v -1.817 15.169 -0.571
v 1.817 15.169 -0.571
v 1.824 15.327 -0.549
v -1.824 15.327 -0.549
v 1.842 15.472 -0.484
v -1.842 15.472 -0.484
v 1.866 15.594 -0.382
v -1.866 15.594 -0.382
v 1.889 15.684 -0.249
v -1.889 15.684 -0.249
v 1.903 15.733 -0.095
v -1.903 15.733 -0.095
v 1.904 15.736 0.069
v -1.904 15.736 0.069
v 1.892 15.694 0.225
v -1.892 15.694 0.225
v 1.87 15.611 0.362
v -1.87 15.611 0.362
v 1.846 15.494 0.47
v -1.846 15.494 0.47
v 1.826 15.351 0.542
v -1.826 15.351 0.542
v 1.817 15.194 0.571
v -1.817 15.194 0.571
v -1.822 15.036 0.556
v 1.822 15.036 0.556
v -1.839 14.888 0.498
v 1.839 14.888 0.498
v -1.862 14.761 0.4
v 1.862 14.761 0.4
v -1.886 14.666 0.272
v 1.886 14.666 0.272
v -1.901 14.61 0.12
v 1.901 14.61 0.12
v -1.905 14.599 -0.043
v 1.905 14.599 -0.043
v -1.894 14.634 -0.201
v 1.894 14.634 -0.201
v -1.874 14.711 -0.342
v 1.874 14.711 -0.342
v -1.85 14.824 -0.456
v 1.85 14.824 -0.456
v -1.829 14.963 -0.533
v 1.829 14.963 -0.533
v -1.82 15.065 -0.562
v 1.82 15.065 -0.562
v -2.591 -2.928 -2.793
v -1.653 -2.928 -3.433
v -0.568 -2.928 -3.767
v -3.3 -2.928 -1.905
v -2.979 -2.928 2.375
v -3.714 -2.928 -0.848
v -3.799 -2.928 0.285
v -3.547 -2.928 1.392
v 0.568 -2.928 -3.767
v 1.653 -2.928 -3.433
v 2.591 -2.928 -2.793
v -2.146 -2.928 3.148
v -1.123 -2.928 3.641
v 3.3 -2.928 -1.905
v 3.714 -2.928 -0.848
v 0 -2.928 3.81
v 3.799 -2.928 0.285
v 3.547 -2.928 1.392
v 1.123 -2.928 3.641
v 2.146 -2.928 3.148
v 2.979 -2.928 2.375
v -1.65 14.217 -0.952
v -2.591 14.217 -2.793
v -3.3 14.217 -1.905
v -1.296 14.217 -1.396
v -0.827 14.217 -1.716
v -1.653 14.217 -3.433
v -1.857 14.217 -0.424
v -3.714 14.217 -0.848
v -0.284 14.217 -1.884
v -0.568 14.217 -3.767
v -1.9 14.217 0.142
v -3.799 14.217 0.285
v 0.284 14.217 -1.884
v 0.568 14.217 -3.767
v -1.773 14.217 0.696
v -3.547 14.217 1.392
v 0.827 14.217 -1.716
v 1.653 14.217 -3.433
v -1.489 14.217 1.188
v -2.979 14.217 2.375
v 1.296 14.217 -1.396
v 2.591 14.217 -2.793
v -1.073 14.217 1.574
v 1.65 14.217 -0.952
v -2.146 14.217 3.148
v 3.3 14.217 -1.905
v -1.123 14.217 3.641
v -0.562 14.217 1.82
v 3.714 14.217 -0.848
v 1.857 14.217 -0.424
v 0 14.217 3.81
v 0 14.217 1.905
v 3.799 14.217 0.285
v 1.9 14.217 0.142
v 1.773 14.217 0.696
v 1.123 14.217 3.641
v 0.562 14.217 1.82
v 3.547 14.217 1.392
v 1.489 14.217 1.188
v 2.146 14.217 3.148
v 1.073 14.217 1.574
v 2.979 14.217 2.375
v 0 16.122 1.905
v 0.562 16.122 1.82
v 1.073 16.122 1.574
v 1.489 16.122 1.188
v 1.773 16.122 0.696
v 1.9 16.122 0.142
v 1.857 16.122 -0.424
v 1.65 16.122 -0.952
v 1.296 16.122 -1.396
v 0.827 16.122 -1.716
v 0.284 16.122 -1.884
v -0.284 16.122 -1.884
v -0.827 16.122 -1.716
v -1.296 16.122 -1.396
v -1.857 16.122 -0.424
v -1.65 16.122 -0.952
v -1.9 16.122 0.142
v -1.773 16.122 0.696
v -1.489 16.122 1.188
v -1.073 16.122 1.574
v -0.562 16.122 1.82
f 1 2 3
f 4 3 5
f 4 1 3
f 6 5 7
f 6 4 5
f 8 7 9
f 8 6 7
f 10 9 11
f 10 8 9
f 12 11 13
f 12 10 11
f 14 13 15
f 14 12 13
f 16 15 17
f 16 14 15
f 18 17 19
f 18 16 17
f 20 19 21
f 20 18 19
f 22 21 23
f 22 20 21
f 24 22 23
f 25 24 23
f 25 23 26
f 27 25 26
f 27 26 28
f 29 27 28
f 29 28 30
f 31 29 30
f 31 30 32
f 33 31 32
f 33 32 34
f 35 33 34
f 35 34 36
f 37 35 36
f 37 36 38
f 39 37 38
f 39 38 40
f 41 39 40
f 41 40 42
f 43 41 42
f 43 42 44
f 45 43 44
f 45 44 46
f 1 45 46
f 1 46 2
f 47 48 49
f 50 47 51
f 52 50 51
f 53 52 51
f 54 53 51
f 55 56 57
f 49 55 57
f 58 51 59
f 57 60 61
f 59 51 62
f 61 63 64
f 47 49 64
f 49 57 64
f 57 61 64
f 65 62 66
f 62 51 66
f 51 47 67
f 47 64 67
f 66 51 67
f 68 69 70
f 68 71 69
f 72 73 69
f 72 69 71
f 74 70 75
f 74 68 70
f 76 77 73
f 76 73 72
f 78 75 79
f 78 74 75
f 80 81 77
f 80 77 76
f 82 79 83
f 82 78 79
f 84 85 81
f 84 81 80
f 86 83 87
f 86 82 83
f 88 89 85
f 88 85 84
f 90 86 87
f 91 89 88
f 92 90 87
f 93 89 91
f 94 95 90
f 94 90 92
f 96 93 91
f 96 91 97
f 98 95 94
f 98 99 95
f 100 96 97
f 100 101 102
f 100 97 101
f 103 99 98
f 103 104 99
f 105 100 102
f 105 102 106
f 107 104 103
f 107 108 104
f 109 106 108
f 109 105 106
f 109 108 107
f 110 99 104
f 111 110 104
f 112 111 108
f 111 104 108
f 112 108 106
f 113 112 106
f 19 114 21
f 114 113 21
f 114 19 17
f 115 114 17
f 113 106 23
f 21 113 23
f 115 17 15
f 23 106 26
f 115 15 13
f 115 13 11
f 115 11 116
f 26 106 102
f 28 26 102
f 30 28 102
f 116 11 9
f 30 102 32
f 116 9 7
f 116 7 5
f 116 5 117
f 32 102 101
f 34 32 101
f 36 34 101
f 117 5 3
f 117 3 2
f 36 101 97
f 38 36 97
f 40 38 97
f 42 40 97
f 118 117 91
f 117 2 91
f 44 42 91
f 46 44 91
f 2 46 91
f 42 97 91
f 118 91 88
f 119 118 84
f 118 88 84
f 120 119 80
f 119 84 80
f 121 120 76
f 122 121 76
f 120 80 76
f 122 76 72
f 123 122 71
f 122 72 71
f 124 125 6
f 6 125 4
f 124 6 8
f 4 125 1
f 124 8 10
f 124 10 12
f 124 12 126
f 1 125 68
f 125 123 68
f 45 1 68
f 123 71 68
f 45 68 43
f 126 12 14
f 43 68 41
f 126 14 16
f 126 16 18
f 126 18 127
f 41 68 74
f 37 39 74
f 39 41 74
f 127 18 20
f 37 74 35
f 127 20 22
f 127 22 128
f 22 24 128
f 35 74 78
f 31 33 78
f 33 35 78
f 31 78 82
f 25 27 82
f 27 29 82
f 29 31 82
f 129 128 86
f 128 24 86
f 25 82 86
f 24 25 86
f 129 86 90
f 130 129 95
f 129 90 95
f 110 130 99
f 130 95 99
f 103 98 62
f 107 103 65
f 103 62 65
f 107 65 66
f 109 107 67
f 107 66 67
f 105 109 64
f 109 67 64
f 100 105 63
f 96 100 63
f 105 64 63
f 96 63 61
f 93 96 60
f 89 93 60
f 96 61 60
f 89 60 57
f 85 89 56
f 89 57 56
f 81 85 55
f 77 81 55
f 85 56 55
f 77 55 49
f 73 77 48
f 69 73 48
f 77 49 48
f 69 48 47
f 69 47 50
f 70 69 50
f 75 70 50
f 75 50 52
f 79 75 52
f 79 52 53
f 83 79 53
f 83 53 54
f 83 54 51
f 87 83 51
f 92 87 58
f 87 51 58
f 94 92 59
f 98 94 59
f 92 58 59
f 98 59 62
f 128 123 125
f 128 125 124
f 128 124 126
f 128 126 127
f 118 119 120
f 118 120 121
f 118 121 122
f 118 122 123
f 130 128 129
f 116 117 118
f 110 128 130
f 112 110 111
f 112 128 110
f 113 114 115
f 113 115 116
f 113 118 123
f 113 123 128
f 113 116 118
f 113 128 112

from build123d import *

# Parameters (mm, degrees)
SKETCH1_R               = 2.54
BOSS_EXTRUDE1_DEPTH     = 11.43
SKETCH2_R               = 1.27
BOSS_EXTRUDE2_DEPTH     = 1.27
CUT_EXTRUDE1_DEPTH      = 14.198227154
CUT_EXTRUDE1_DEPTH_BACK = 14.198227154
SKETCH3_R               = 0.381
SCALE1_SCALE            = 1.5


with BuildPart() as part:
    # Sketch1 → Boss-Extrude1 (new body)
    with BuildSketch(Plane(origin=(0, 0, 0), x_dir=(1, 0, 0), z_dir=(0, 1, 0))):
        with Locations(Location((0, 0, 0), (0, 0, 270))):
            Circle(SKETCH1_R)
    extrude(amount=BOSS_EXTRUDE1_DEPTH)

    # Sketch2 → Boss-Extrude2 (add)
    with BuildSketch(Plane(origin=(0, 11.43, 0), x_dir=(1, 0, 0), z_dir=(0, 1, 0))):
        with Locations(Location((0, 0, 0), (0, 0, 270))):
            Circle(SKETCH2_R)
    extrude(amount=BOSS_EXTRUDE2_DEPTH)

    # Sketch3 → Cut-Extrude1 (cut, two sides: drawn at the far end of the back side and taken through both)
    with BuildSketch(Plane(origin=(0, 0, 0), x_dir=(0, 0, -1), z_dir=(1, 0, 0)).offset(-CUT_EXTRUDE1_DEPTH_BACK)):
        with Locations((0, 12.065)):
            Circle(SKETCH3_R)
    extrude(amount=CUT_EXTRUDE1_DEPTH + CUT_EXTRUDE1_DEPTH_BACK, mode=Mode.SUBTRACT)


with BuildPart() as part_1:
    # Scale1: scaled about (0, 5.856765052, -1.11e-07)
    add(part.part.scale(SCALE1_SCALE).moved(Location((0, -2.928382526, 5.6e-08))))


solid = part_1.part
